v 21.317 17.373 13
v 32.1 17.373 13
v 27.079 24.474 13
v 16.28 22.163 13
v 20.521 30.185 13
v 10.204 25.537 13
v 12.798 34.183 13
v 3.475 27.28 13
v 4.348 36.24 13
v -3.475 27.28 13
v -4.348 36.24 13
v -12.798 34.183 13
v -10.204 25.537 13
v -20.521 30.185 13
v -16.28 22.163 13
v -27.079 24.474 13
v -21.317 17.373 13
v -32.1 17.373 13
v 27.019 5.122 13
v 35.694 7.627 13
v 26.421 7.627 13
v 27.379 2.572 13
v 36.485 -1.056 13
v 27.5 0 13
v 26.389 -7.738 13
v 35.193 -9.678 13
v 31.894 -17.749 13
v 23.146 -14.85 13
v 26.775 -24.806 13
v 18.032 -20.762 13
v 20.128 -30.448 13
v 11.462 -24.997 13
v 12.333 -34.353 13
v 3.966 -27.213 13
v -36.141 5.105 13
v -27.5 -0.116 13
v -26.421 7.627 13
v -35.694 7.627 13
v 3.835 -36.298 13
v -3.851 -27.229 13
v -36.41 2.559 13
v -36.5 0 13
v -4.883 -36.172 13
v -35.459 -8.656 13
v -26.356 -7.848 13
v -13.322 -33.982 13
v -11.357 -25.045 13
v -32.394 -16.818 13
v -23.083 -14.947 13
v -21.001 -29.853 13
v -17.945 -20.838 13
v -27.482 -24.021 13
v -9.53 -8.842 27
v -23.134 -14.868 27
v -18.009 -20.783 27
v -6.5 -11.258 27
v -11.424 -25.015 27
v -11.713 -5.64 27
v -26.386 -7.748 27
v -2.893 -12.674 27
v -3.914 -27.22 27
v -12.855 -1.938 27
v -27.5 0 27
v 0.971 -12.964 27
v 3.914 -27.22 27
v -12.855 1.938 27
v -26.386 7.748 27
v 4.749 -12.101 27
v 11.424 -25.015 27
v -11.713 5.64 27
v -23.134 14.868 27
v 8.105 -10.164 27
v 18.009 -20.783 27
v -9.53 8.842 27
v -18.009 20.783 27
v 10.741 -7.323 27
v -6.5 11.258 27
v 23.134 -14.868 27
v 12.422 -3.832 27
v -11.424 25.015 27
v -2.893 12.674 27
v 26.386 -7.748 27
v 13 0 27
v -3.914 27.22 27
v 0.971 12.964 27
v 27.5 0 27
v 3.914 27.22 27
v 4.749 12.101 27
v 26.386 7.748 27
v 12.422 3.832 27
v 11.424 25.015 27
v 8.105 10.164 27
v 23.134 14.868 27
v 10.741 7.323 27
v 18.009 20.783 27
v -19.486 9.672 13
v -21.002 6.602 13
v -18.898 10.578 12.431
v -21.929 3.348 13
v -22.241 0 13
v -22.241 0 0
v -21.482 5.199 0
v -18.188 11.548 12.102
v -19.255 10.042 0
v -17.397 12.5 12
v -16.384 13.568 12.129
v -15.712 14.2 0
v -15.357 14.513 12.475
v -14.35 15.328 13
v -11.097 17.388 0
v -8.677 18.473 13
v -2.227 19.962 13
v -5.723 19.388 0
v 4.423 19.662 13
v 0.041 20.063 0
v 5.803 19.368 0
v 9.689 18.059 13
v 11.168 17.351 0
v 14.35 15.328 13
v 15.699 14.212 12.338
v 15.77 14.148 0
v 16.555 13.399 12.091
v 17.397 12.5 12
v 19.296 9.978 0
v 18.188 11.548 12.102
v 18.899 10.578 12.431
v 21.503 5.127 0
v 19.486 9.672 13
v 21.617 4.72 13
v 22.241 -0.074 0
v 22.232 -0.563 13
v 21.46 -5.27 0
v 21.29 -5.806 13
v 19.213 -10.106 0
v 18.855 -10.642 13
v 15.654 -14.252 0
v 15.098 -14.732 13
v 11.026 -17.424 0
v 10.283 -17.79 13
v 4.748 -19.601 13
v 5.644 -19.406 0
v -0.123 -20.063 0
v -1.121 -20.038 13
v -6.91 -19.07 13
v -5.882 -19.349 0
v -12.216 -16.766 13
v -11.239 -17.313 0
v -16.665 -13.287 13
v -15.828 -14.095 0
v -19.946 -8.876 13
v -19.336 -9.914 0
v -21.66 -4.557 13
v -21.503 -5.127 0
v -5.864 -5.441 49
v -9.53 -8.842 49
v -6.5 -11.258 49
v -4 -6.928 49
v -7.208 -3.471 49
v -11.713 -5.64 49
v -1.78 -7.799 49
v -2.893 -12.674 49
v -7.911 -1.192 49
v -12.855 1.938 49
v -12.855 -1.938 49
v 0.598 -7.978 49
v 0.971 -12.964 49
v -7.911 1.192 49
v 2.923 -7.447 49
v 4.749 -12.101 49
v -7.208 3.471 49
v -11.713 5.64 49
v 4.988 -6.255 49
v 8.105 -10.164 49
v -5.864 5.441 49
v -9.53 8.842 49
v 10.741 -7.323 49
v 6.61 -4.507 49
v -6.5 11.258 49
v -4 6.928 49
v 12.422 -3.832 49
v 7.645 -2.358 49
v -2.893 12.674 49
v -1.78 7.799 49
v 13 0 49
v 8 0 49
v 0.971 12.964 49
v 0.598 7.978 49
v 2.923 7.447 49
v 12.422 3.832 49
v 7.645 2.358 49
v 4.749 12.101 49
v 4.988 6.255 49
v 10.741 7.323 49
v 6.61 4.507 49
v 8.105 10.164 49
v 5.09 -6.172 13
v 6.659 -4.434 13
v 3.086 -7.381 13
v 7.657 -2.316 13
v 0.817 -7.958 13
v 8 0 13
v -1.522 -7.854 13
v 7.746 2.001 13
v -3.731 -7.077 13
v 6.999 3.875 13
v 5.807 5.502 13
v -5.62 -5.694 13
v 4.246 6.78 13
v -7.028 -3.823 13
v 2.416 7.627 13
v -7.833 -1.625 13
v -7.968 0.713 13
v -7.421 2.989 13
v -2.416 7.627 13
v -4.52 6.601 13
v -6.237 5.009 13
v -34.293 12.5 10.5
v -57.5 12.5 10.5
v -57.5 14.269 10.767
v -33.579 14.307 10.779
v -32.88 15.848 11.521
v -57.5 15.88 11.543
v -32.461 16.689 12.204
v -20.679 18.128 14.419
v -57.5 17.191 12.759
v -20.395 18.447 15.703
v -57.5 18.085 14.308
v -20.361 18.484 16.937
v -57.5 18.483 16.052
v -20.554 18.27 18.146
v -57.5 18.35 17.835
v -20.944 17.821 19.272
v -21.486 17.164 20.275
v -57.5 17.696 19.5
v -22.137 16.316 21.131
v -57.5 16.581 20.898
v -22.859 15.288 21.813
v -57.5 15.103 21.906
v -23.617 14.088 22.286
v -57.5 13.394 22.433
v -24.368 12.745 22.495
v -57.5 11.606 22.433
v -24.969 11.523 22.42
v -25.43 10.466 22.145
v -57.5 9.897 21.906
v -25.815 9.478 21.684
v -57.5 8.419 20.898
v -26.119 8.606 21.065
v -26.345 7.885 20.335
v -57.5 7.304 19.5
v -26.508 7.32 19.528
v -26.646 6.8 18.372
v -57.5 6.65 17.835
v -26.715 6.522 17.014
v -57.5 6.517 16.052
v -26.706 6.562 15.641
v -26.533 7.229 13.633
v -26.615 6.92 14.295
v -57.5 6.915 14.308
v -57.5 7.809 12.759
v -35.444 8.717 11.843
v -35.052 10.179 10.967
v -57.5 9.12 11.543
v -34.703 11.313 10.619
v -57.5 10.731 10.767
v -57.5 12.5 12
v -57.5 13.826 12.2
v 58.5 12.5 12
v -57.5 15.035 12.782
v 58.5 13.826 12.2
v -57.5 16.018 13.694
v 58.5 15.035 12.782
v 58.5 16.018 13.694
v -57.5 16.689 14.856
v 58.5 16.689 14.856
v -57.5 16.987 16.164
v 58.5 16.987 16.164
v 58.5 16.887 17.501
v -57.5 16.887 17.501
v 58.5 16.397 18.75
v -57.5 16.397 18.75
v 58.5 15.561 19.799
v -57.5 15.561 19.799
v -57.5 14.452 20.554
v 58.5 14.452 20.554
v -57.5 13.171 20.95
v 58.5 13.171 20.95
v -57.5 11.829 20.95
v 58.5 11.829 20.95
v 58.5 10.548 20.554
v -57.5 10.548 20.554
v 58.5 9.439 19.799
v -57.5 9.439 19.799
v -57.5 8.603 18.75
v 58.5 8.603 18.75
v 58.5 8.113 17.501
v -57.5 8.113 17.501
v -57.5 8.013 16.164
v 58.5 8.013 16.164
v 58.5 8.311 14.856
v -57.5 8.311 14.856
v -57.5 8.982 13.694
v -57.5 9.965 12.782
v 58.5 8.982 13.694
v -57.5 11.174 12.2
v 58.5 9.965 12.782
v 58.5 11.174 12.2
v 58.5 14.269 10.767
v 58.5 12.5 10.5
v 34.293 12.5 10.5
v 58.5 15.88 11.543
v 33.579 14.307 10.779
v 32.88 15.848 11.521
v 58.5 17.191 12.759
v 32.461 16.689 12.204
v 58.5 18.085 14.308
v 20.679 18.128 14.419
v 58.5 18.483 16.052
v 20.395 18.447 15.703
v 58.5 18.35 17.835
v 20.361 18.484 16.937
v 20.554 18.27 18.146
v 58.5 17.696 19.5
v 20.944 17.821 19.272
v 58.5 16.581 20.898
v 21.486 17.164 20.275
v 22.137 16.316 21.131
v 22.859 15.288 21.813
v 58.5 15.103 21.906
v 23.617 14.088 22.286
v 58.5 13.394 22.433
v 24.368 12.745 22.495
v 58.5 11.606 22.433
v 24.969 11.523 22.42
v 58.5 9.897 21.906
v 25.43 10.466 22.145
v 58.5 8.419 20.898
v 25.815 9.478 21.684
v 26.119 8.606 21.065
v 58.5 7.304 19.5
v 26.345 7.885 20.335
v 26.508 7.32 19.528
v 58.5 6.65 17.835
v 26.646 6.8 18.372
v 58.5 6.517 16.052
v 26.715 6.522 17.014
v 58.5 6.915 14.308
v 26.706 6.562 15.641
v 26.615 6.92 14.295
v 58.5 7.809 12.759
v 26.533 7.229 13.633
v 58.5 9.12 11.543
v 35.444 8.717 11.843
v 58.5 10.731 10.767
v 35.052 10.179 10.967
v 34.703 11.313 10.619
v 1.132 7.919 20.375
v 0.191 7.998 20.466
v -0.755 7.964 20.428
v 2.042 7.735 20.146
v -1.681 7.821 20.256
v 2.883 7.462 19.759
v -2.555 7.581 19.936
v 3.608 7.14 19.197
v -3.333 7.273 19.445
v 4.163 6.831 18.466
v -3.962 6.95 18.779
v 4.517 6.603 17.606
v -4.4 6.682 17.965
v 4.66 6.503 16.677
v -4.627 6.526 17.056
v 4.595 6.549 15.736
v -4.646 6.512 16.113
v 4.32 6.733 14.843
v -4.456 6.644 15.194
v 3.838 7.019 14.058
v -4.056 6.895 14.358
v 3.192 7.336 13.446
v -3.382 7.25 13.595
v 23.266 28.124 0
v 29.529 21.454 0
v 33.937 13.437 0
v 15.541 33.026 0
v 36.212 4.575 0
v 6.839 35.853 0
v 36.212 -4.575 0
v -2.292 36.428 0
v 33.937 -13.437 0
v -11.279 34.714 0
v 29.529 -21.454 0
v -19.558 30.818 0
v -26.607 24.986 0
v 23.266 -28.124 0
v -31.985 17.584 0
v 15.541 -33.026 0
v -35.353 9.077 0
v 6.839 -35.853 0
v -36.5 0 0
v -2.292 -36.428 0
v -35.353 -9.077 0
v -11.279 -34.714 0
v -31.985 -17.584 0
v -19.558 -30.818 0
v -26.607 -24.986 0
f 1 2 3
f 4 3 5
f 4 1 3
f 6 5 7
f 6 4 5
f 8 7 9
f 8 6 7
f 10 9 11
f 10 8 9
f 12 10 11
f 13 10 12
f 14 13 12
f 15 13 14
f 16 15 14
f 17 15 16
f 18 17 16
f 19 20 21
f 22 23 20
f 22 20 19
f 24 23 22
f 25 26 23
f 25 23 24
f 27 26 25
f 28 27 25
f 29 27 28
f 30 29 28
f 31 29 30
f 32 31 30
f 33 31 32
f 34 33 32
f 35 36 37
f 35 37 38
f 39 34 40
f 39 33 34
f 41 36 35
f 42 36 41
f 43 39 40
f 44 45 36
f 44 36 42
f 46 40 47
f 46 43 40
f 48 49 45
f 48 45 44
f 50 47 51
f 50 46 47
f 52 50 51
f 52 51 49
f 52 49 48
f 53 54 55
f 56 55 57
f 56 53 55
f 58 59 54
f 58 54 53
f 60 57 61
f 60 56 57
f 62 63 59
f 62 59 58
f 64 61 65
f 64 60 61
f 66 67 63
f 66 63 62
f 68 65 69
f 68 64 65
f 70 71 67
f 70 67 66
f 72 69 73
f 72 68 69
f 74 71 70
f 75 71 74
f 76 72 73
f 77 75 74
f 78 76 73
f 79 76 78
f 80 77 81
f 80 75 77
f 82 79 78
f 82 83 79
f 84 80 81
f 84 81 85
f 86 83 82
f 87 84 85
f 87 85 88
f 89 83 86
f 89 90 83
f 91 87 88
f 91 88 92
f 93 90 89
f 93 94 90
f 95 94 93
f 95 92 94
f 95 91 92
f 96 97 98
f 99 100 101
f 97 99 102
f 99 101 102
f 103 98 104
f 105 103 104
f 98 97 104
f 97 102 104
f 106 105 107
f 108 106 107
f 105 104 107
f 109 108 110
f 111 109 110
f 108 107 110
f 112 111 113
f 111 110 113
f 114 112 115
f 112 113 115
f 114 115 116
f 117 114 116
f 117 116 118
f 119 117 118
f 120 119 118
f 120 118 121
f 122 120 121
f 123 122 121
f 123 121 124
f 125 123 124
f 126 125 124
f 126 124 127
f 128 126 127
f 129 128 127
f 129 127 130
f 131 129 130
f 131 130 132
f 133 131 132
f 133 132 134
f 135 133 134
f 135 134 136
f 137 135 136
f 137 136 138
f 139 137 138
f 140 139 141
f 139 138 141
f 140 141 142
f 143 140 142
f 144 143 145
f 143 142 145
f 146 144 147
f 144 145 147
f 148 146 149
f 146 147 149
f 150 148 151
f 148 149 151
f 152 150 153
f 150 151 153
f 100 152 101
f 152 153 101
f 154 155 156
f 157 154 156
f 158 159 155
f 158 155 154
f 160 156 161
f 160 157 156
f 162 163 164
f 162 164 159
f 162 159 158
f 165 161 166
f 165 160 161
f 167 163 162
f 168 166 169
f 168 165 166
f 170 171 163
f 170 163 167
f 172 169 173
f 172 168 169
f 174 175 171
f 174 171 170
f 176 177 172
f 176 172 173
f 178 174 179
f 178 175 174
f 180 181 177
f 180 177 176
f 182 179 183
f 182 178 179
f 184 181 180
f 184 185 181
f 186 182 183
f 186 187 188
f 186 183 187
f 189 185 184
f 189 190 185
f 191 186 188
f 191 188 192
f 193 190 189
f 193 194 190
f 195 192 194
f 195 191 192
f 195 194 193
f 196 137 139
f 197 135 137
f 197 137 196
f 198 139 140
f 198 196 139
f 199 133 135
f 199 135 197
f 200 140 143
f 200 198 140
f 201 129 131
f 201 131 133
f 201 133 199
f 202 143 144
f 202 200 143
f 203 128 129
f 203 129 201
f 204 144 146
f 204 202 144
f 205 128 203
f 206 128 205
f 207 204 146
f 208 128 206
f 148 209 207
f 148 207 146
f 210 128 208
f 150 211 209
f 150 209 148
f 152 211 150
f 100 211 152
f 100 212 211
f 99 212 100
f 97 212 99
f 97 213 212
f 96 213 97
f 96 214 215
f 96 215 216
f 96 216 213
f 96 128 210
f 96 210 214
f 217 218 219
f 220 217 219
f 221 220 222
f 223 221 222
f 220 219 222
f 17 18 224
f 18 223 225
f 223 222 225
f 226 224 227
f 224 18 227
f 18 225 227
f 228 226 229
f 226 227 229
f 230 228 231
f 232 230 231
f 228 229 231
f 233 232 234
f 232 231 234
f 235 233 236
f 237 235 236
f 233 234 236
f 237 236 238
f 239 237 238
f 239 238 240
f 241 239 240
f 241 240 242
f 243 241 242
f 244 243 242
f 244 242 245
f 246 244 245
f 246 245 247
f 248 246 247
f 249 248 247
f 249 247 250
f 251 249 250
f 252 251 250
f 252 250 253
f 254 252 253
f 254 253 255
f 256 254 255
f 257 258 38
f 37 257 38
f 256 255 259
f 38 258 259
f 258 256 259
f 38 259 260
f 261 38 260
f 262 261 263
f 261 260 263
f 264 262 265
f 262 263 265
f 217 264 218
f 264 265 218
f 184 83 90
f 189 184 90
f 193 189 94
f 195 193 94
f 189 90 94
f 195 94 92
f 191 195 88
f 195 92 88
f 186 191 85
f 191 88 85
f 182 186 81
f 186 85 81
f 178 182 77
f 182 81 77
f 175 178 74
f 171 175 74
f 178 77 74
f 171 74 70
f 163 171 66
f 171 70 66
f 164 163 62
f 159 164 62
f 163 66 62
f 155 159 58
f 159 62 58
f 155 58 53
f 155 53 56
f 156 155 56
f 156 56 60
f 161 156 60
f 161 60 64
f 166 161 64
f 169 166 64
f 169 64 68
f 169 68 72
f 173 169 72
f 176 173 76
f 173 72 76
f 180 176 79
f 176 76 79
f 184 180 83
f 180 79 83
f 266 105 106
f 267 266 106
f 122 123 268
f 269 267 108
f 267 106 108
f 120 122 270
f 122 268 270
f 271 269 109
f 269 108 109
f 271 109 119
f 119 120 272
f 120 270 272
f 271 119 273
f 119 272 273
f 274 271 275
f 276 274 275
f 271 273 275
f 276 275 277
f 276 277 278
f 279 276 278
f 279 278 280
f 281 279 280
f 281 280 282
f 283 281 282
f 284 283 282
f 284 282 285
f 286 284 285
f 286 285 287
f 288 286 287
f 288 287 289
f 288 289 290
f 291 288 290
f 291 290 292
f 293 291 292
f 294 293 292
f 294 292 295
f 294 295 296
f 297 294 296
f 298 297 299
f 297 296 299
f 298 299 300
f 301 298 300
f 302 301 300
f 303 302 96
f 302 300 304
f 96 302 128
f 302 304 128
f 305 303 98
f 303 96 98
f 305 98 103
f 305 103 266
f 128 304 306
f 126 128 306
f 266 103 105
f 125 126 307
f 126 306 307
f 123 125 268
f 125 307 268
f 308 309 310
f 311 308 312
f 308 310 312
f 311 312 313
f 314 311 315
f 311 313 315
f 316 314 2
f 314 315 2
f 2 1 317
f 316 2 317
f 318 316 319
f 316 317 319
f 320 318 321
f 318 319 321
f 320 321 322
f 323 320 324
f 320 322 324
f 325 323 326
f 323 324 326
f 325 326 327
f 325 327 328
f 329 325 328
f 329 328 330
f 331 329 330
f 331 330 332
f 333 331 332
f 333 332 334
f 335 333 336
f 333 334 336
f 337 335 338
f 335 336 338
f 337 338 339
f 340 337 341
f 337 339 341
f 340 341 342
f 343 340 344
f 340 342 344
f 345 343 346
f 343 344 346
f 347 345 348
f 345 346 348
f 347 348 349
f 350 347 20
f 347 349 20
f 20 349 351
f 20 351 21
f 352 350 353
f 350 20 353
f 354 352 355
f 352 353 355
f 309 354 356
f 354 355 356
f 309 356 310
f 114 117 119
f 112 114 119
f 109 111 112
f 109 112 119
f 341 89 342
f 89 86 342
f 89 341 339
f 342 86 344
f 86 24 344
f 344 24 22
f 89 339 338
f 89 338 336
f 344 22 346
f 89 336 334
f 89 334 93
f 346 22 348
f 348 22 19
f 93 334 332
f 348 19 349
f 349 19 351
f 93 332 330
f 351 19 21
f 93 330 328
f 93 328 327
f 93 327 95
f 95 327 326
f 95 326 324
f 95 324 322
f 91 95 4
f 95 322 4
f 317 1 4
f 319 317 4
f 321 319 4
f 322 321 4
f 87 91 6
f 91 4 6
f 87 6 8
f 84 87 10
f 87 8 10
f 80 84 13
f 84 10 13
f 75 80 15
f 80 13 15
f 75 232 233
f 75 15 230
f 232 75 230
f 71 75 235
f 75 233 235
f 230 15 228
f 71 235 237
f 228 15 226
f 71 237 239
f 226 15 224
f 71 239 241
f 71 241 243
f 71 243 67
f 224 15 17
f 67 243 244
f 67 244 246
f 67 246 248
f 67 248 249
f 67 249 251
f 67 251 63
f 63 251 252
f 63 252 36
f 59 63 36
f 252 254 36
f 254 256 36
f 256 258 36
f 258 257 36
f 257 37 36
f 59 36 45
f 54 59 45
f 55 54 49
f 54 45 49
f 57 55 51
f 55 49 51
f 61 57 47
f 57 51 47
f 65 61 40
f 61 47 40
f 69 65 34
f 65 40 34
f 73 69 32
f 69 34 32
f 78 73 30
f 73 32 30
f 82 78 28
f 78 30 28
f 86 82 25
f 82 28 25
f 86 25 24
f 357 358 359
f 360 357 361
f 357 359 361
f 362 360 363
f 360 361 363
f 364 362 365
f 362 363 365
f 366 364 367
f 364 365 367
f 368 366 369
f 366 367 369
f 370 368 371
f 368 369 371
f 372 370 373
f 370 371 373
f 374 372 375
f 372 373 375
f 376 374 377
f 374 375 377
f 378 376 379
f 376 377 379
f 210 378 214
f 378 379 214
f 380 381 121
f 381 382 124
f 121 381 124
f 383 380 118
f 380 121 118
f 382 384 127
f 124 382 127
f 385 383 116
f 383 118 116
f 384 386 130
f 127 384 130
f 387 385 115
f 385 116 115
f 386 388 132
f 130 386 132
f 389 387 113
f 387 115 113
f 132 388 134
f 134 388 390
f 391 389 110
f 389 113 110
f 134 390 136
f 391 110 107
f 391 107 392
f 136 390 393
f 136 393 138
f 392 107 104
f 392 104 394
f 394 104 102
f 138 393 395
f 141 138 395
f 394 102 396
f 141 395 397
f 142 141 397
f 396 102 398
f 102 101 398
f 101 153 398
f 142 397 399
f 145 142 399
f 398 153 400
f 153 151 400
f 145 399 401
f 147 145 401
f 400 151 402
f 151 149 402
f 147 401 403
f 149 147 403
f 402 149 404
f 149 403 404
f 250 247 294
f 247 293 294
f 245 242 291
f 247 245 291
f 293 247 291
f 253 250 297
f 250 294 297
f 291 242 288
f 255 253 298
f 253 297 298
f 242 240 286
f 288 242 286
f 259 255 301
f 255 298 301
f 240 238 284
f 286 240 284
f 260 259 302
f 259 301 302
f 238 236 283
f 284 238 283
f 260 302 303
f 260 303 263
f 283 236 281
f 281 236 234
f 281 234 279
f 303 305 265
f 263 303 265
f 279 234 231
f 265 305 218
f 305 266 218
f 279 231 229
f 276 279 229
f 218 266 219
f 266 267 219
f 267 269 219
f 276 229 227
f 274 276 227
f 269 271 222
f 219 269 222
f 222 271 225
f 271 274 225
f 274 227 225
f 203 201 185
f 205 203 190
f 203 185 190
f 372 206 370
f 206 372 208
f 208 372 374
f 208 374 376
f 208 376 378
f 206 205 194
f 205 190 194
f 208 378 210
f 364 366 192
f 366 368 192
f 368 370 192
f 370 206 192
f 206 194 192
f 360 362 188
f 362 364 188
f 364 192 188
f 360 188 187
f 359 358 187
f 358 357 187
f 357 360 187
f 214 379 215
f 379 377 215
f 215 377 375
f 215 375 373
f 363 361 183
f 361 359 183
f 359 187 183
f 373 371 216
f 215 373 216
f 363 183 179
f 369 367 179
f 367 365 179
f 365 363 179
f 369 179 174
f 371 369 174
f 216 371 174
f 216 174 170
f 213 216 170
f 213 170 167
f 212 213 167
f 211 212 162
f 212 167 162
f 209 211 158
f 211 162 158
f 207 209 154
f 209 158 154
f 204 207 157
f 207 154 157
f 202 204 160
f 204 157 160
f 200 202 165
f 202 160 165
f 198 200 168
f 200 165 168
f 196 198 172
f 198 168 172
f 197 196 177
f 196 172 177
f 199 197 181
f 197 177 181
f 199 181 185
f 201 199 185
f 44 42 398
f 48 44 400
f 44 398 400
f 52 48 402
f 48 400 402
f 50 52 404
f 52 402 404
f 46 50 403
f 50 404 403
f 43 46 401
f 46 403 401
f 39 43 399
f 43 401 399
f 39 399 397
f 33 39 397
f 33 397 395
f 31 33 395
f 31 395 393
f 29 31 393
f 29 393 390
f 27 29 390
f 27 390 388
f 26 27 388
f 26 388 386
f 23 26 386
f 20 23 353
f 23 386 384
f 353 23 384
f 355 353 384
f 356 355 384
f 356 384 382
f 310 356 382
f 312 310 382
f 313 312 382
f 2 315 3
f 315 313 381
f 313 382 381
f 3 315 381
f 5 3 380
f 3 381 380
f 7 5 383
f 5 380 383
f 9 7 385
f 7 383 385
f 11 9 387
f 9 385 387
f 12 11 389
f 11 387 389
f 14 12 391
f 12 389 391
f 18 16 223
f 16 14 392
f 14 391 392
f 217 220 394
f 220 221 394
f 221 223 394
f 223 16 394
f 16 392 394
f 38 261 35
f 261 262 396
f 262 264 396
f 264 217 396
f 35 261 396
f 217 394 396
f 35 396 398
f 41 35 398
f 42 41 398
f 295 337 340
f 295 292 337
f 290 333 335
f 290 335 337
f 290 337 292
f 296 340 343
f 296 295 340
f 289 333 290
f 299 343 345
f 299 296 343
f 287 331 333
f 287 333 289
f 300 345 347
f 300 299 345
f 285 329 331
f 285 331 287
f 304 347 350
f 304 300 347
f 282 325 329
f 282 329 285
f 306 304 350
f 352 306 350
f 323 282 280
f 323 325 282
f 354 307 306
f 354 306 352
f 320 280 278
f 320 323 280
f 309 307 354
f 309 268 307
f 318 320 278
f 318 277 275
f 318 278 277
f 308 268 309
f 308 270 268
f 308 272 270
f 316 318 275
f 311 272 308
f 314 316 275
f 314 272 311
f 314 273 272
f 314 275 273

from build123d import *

# Parameters (mm, degrees)
SKETCH1_R                = 36.5
BOSS_EXTRUDE1_DEPTH      = 13
SKETCH2_R                = 27.5
BOSS_EXTRUDE2_DEPTH      = 14
SKETCH3_R                = 13
BOSS_EXTRUDE3_DEPTH      = 22
SKETCH4_R                = 8
CUT_EXTRUDE1_DEPTH       = 72.172326083
BOSS_EXTRUDE4_DEPTH      = 22
BOSS_EXTRUDE4_DEPTH_BACK = 94
SKETCH6_R                = 6
SKETCH8_RX               = 22.241182767
SKETCH8_RY               = 20.063201952
CUT_EXTRUDE2_DEPTH       = 13
SKETCH10_R               = 4.5
CUT_EXTRUDE3_DEPTH       = 132.107780243


with BuildPart() as part:
    # Sketch1 → Boss-Extrude1 (new body)
    with BuildSketch(Plane.XY):
        with Locations(Location((0, 0, 0), (0, 0, 180))):
            Circle(SKETCH1_R)
    extrude(amount=BOSS_EXTRUDE1_DEPTH)

    # Sketch2 → Boss-Extrude2 (add)
    with BuildSketch(Plane.XY.offset(13)):
        Circle(SKETCH2_R)
    extrude(amount=BOSS_EXTRUDE2_DEPTH)

    # Sketch3 → Boss-Extrude3 (add)
    with BuildSketch(Plane.XY.offset(27)):
        Circle(SKETCH3_R)
    extrude(amount=BOSS_EXTRUDE3_DEPTH)

    # Sketch4 → Cut-Extrude1 (cut, through all)
    with BuildSketch(Plane.XY.offset(49)):
        Circle(SKETCH4_R)
    extrude(amount=-CUT_EXTRUDE1_DEPTH, mode=Mode.SUBTRACT)

    # Sketch6 → Boss-Extrude4 (add, two sides: drawn at the far end of the back side and taken through both)
    with BuildSketch(Plane(origin=(36.5, 0, 0), x_dir=(0, 0, -1), z_dir=(1, 0, 0)).offset(-BOSS_EXTRUDE4_DEPTH_BACK)):
        with Locations((-16.5, 12.5)):
            Circle(SKETCH6_R)
    extrude(amount=BOSS_EXTRUDE4_DEPTH + BOSS_EXTRUDE4_DEPTH_BACK)

    # Sketch8 → Cut-Extrude2 (cut)
    with BuildSketch(Plane(origin=(0, 0, 0), x_dir=(-1, 0, 0), z_dir=(0, 0, -1))):
        with Locations((0, 0)):
            Ellipse(SKETCH8_RX, SKETCH8_RY)
    extrude(amount=-CUT_EXTRUDE2_DEPTH, mode=Mode.SUBTRACT)

    # Sketch10 → Cut-Extrude3 (cut, through all)
    with BuildSketch(Plane(origin=(58.5, 0, 0), x_dir=(0, 0, -1), z_dir=(1, 0, 0))):
        with Locations((-16.5, 12.5)):
            Circle(SKETCH10_R)
    extrude(amount=-CUT_EXTRUDE3_DEPTH, mode=Mode.SUBTRACT)


solid = part.part
